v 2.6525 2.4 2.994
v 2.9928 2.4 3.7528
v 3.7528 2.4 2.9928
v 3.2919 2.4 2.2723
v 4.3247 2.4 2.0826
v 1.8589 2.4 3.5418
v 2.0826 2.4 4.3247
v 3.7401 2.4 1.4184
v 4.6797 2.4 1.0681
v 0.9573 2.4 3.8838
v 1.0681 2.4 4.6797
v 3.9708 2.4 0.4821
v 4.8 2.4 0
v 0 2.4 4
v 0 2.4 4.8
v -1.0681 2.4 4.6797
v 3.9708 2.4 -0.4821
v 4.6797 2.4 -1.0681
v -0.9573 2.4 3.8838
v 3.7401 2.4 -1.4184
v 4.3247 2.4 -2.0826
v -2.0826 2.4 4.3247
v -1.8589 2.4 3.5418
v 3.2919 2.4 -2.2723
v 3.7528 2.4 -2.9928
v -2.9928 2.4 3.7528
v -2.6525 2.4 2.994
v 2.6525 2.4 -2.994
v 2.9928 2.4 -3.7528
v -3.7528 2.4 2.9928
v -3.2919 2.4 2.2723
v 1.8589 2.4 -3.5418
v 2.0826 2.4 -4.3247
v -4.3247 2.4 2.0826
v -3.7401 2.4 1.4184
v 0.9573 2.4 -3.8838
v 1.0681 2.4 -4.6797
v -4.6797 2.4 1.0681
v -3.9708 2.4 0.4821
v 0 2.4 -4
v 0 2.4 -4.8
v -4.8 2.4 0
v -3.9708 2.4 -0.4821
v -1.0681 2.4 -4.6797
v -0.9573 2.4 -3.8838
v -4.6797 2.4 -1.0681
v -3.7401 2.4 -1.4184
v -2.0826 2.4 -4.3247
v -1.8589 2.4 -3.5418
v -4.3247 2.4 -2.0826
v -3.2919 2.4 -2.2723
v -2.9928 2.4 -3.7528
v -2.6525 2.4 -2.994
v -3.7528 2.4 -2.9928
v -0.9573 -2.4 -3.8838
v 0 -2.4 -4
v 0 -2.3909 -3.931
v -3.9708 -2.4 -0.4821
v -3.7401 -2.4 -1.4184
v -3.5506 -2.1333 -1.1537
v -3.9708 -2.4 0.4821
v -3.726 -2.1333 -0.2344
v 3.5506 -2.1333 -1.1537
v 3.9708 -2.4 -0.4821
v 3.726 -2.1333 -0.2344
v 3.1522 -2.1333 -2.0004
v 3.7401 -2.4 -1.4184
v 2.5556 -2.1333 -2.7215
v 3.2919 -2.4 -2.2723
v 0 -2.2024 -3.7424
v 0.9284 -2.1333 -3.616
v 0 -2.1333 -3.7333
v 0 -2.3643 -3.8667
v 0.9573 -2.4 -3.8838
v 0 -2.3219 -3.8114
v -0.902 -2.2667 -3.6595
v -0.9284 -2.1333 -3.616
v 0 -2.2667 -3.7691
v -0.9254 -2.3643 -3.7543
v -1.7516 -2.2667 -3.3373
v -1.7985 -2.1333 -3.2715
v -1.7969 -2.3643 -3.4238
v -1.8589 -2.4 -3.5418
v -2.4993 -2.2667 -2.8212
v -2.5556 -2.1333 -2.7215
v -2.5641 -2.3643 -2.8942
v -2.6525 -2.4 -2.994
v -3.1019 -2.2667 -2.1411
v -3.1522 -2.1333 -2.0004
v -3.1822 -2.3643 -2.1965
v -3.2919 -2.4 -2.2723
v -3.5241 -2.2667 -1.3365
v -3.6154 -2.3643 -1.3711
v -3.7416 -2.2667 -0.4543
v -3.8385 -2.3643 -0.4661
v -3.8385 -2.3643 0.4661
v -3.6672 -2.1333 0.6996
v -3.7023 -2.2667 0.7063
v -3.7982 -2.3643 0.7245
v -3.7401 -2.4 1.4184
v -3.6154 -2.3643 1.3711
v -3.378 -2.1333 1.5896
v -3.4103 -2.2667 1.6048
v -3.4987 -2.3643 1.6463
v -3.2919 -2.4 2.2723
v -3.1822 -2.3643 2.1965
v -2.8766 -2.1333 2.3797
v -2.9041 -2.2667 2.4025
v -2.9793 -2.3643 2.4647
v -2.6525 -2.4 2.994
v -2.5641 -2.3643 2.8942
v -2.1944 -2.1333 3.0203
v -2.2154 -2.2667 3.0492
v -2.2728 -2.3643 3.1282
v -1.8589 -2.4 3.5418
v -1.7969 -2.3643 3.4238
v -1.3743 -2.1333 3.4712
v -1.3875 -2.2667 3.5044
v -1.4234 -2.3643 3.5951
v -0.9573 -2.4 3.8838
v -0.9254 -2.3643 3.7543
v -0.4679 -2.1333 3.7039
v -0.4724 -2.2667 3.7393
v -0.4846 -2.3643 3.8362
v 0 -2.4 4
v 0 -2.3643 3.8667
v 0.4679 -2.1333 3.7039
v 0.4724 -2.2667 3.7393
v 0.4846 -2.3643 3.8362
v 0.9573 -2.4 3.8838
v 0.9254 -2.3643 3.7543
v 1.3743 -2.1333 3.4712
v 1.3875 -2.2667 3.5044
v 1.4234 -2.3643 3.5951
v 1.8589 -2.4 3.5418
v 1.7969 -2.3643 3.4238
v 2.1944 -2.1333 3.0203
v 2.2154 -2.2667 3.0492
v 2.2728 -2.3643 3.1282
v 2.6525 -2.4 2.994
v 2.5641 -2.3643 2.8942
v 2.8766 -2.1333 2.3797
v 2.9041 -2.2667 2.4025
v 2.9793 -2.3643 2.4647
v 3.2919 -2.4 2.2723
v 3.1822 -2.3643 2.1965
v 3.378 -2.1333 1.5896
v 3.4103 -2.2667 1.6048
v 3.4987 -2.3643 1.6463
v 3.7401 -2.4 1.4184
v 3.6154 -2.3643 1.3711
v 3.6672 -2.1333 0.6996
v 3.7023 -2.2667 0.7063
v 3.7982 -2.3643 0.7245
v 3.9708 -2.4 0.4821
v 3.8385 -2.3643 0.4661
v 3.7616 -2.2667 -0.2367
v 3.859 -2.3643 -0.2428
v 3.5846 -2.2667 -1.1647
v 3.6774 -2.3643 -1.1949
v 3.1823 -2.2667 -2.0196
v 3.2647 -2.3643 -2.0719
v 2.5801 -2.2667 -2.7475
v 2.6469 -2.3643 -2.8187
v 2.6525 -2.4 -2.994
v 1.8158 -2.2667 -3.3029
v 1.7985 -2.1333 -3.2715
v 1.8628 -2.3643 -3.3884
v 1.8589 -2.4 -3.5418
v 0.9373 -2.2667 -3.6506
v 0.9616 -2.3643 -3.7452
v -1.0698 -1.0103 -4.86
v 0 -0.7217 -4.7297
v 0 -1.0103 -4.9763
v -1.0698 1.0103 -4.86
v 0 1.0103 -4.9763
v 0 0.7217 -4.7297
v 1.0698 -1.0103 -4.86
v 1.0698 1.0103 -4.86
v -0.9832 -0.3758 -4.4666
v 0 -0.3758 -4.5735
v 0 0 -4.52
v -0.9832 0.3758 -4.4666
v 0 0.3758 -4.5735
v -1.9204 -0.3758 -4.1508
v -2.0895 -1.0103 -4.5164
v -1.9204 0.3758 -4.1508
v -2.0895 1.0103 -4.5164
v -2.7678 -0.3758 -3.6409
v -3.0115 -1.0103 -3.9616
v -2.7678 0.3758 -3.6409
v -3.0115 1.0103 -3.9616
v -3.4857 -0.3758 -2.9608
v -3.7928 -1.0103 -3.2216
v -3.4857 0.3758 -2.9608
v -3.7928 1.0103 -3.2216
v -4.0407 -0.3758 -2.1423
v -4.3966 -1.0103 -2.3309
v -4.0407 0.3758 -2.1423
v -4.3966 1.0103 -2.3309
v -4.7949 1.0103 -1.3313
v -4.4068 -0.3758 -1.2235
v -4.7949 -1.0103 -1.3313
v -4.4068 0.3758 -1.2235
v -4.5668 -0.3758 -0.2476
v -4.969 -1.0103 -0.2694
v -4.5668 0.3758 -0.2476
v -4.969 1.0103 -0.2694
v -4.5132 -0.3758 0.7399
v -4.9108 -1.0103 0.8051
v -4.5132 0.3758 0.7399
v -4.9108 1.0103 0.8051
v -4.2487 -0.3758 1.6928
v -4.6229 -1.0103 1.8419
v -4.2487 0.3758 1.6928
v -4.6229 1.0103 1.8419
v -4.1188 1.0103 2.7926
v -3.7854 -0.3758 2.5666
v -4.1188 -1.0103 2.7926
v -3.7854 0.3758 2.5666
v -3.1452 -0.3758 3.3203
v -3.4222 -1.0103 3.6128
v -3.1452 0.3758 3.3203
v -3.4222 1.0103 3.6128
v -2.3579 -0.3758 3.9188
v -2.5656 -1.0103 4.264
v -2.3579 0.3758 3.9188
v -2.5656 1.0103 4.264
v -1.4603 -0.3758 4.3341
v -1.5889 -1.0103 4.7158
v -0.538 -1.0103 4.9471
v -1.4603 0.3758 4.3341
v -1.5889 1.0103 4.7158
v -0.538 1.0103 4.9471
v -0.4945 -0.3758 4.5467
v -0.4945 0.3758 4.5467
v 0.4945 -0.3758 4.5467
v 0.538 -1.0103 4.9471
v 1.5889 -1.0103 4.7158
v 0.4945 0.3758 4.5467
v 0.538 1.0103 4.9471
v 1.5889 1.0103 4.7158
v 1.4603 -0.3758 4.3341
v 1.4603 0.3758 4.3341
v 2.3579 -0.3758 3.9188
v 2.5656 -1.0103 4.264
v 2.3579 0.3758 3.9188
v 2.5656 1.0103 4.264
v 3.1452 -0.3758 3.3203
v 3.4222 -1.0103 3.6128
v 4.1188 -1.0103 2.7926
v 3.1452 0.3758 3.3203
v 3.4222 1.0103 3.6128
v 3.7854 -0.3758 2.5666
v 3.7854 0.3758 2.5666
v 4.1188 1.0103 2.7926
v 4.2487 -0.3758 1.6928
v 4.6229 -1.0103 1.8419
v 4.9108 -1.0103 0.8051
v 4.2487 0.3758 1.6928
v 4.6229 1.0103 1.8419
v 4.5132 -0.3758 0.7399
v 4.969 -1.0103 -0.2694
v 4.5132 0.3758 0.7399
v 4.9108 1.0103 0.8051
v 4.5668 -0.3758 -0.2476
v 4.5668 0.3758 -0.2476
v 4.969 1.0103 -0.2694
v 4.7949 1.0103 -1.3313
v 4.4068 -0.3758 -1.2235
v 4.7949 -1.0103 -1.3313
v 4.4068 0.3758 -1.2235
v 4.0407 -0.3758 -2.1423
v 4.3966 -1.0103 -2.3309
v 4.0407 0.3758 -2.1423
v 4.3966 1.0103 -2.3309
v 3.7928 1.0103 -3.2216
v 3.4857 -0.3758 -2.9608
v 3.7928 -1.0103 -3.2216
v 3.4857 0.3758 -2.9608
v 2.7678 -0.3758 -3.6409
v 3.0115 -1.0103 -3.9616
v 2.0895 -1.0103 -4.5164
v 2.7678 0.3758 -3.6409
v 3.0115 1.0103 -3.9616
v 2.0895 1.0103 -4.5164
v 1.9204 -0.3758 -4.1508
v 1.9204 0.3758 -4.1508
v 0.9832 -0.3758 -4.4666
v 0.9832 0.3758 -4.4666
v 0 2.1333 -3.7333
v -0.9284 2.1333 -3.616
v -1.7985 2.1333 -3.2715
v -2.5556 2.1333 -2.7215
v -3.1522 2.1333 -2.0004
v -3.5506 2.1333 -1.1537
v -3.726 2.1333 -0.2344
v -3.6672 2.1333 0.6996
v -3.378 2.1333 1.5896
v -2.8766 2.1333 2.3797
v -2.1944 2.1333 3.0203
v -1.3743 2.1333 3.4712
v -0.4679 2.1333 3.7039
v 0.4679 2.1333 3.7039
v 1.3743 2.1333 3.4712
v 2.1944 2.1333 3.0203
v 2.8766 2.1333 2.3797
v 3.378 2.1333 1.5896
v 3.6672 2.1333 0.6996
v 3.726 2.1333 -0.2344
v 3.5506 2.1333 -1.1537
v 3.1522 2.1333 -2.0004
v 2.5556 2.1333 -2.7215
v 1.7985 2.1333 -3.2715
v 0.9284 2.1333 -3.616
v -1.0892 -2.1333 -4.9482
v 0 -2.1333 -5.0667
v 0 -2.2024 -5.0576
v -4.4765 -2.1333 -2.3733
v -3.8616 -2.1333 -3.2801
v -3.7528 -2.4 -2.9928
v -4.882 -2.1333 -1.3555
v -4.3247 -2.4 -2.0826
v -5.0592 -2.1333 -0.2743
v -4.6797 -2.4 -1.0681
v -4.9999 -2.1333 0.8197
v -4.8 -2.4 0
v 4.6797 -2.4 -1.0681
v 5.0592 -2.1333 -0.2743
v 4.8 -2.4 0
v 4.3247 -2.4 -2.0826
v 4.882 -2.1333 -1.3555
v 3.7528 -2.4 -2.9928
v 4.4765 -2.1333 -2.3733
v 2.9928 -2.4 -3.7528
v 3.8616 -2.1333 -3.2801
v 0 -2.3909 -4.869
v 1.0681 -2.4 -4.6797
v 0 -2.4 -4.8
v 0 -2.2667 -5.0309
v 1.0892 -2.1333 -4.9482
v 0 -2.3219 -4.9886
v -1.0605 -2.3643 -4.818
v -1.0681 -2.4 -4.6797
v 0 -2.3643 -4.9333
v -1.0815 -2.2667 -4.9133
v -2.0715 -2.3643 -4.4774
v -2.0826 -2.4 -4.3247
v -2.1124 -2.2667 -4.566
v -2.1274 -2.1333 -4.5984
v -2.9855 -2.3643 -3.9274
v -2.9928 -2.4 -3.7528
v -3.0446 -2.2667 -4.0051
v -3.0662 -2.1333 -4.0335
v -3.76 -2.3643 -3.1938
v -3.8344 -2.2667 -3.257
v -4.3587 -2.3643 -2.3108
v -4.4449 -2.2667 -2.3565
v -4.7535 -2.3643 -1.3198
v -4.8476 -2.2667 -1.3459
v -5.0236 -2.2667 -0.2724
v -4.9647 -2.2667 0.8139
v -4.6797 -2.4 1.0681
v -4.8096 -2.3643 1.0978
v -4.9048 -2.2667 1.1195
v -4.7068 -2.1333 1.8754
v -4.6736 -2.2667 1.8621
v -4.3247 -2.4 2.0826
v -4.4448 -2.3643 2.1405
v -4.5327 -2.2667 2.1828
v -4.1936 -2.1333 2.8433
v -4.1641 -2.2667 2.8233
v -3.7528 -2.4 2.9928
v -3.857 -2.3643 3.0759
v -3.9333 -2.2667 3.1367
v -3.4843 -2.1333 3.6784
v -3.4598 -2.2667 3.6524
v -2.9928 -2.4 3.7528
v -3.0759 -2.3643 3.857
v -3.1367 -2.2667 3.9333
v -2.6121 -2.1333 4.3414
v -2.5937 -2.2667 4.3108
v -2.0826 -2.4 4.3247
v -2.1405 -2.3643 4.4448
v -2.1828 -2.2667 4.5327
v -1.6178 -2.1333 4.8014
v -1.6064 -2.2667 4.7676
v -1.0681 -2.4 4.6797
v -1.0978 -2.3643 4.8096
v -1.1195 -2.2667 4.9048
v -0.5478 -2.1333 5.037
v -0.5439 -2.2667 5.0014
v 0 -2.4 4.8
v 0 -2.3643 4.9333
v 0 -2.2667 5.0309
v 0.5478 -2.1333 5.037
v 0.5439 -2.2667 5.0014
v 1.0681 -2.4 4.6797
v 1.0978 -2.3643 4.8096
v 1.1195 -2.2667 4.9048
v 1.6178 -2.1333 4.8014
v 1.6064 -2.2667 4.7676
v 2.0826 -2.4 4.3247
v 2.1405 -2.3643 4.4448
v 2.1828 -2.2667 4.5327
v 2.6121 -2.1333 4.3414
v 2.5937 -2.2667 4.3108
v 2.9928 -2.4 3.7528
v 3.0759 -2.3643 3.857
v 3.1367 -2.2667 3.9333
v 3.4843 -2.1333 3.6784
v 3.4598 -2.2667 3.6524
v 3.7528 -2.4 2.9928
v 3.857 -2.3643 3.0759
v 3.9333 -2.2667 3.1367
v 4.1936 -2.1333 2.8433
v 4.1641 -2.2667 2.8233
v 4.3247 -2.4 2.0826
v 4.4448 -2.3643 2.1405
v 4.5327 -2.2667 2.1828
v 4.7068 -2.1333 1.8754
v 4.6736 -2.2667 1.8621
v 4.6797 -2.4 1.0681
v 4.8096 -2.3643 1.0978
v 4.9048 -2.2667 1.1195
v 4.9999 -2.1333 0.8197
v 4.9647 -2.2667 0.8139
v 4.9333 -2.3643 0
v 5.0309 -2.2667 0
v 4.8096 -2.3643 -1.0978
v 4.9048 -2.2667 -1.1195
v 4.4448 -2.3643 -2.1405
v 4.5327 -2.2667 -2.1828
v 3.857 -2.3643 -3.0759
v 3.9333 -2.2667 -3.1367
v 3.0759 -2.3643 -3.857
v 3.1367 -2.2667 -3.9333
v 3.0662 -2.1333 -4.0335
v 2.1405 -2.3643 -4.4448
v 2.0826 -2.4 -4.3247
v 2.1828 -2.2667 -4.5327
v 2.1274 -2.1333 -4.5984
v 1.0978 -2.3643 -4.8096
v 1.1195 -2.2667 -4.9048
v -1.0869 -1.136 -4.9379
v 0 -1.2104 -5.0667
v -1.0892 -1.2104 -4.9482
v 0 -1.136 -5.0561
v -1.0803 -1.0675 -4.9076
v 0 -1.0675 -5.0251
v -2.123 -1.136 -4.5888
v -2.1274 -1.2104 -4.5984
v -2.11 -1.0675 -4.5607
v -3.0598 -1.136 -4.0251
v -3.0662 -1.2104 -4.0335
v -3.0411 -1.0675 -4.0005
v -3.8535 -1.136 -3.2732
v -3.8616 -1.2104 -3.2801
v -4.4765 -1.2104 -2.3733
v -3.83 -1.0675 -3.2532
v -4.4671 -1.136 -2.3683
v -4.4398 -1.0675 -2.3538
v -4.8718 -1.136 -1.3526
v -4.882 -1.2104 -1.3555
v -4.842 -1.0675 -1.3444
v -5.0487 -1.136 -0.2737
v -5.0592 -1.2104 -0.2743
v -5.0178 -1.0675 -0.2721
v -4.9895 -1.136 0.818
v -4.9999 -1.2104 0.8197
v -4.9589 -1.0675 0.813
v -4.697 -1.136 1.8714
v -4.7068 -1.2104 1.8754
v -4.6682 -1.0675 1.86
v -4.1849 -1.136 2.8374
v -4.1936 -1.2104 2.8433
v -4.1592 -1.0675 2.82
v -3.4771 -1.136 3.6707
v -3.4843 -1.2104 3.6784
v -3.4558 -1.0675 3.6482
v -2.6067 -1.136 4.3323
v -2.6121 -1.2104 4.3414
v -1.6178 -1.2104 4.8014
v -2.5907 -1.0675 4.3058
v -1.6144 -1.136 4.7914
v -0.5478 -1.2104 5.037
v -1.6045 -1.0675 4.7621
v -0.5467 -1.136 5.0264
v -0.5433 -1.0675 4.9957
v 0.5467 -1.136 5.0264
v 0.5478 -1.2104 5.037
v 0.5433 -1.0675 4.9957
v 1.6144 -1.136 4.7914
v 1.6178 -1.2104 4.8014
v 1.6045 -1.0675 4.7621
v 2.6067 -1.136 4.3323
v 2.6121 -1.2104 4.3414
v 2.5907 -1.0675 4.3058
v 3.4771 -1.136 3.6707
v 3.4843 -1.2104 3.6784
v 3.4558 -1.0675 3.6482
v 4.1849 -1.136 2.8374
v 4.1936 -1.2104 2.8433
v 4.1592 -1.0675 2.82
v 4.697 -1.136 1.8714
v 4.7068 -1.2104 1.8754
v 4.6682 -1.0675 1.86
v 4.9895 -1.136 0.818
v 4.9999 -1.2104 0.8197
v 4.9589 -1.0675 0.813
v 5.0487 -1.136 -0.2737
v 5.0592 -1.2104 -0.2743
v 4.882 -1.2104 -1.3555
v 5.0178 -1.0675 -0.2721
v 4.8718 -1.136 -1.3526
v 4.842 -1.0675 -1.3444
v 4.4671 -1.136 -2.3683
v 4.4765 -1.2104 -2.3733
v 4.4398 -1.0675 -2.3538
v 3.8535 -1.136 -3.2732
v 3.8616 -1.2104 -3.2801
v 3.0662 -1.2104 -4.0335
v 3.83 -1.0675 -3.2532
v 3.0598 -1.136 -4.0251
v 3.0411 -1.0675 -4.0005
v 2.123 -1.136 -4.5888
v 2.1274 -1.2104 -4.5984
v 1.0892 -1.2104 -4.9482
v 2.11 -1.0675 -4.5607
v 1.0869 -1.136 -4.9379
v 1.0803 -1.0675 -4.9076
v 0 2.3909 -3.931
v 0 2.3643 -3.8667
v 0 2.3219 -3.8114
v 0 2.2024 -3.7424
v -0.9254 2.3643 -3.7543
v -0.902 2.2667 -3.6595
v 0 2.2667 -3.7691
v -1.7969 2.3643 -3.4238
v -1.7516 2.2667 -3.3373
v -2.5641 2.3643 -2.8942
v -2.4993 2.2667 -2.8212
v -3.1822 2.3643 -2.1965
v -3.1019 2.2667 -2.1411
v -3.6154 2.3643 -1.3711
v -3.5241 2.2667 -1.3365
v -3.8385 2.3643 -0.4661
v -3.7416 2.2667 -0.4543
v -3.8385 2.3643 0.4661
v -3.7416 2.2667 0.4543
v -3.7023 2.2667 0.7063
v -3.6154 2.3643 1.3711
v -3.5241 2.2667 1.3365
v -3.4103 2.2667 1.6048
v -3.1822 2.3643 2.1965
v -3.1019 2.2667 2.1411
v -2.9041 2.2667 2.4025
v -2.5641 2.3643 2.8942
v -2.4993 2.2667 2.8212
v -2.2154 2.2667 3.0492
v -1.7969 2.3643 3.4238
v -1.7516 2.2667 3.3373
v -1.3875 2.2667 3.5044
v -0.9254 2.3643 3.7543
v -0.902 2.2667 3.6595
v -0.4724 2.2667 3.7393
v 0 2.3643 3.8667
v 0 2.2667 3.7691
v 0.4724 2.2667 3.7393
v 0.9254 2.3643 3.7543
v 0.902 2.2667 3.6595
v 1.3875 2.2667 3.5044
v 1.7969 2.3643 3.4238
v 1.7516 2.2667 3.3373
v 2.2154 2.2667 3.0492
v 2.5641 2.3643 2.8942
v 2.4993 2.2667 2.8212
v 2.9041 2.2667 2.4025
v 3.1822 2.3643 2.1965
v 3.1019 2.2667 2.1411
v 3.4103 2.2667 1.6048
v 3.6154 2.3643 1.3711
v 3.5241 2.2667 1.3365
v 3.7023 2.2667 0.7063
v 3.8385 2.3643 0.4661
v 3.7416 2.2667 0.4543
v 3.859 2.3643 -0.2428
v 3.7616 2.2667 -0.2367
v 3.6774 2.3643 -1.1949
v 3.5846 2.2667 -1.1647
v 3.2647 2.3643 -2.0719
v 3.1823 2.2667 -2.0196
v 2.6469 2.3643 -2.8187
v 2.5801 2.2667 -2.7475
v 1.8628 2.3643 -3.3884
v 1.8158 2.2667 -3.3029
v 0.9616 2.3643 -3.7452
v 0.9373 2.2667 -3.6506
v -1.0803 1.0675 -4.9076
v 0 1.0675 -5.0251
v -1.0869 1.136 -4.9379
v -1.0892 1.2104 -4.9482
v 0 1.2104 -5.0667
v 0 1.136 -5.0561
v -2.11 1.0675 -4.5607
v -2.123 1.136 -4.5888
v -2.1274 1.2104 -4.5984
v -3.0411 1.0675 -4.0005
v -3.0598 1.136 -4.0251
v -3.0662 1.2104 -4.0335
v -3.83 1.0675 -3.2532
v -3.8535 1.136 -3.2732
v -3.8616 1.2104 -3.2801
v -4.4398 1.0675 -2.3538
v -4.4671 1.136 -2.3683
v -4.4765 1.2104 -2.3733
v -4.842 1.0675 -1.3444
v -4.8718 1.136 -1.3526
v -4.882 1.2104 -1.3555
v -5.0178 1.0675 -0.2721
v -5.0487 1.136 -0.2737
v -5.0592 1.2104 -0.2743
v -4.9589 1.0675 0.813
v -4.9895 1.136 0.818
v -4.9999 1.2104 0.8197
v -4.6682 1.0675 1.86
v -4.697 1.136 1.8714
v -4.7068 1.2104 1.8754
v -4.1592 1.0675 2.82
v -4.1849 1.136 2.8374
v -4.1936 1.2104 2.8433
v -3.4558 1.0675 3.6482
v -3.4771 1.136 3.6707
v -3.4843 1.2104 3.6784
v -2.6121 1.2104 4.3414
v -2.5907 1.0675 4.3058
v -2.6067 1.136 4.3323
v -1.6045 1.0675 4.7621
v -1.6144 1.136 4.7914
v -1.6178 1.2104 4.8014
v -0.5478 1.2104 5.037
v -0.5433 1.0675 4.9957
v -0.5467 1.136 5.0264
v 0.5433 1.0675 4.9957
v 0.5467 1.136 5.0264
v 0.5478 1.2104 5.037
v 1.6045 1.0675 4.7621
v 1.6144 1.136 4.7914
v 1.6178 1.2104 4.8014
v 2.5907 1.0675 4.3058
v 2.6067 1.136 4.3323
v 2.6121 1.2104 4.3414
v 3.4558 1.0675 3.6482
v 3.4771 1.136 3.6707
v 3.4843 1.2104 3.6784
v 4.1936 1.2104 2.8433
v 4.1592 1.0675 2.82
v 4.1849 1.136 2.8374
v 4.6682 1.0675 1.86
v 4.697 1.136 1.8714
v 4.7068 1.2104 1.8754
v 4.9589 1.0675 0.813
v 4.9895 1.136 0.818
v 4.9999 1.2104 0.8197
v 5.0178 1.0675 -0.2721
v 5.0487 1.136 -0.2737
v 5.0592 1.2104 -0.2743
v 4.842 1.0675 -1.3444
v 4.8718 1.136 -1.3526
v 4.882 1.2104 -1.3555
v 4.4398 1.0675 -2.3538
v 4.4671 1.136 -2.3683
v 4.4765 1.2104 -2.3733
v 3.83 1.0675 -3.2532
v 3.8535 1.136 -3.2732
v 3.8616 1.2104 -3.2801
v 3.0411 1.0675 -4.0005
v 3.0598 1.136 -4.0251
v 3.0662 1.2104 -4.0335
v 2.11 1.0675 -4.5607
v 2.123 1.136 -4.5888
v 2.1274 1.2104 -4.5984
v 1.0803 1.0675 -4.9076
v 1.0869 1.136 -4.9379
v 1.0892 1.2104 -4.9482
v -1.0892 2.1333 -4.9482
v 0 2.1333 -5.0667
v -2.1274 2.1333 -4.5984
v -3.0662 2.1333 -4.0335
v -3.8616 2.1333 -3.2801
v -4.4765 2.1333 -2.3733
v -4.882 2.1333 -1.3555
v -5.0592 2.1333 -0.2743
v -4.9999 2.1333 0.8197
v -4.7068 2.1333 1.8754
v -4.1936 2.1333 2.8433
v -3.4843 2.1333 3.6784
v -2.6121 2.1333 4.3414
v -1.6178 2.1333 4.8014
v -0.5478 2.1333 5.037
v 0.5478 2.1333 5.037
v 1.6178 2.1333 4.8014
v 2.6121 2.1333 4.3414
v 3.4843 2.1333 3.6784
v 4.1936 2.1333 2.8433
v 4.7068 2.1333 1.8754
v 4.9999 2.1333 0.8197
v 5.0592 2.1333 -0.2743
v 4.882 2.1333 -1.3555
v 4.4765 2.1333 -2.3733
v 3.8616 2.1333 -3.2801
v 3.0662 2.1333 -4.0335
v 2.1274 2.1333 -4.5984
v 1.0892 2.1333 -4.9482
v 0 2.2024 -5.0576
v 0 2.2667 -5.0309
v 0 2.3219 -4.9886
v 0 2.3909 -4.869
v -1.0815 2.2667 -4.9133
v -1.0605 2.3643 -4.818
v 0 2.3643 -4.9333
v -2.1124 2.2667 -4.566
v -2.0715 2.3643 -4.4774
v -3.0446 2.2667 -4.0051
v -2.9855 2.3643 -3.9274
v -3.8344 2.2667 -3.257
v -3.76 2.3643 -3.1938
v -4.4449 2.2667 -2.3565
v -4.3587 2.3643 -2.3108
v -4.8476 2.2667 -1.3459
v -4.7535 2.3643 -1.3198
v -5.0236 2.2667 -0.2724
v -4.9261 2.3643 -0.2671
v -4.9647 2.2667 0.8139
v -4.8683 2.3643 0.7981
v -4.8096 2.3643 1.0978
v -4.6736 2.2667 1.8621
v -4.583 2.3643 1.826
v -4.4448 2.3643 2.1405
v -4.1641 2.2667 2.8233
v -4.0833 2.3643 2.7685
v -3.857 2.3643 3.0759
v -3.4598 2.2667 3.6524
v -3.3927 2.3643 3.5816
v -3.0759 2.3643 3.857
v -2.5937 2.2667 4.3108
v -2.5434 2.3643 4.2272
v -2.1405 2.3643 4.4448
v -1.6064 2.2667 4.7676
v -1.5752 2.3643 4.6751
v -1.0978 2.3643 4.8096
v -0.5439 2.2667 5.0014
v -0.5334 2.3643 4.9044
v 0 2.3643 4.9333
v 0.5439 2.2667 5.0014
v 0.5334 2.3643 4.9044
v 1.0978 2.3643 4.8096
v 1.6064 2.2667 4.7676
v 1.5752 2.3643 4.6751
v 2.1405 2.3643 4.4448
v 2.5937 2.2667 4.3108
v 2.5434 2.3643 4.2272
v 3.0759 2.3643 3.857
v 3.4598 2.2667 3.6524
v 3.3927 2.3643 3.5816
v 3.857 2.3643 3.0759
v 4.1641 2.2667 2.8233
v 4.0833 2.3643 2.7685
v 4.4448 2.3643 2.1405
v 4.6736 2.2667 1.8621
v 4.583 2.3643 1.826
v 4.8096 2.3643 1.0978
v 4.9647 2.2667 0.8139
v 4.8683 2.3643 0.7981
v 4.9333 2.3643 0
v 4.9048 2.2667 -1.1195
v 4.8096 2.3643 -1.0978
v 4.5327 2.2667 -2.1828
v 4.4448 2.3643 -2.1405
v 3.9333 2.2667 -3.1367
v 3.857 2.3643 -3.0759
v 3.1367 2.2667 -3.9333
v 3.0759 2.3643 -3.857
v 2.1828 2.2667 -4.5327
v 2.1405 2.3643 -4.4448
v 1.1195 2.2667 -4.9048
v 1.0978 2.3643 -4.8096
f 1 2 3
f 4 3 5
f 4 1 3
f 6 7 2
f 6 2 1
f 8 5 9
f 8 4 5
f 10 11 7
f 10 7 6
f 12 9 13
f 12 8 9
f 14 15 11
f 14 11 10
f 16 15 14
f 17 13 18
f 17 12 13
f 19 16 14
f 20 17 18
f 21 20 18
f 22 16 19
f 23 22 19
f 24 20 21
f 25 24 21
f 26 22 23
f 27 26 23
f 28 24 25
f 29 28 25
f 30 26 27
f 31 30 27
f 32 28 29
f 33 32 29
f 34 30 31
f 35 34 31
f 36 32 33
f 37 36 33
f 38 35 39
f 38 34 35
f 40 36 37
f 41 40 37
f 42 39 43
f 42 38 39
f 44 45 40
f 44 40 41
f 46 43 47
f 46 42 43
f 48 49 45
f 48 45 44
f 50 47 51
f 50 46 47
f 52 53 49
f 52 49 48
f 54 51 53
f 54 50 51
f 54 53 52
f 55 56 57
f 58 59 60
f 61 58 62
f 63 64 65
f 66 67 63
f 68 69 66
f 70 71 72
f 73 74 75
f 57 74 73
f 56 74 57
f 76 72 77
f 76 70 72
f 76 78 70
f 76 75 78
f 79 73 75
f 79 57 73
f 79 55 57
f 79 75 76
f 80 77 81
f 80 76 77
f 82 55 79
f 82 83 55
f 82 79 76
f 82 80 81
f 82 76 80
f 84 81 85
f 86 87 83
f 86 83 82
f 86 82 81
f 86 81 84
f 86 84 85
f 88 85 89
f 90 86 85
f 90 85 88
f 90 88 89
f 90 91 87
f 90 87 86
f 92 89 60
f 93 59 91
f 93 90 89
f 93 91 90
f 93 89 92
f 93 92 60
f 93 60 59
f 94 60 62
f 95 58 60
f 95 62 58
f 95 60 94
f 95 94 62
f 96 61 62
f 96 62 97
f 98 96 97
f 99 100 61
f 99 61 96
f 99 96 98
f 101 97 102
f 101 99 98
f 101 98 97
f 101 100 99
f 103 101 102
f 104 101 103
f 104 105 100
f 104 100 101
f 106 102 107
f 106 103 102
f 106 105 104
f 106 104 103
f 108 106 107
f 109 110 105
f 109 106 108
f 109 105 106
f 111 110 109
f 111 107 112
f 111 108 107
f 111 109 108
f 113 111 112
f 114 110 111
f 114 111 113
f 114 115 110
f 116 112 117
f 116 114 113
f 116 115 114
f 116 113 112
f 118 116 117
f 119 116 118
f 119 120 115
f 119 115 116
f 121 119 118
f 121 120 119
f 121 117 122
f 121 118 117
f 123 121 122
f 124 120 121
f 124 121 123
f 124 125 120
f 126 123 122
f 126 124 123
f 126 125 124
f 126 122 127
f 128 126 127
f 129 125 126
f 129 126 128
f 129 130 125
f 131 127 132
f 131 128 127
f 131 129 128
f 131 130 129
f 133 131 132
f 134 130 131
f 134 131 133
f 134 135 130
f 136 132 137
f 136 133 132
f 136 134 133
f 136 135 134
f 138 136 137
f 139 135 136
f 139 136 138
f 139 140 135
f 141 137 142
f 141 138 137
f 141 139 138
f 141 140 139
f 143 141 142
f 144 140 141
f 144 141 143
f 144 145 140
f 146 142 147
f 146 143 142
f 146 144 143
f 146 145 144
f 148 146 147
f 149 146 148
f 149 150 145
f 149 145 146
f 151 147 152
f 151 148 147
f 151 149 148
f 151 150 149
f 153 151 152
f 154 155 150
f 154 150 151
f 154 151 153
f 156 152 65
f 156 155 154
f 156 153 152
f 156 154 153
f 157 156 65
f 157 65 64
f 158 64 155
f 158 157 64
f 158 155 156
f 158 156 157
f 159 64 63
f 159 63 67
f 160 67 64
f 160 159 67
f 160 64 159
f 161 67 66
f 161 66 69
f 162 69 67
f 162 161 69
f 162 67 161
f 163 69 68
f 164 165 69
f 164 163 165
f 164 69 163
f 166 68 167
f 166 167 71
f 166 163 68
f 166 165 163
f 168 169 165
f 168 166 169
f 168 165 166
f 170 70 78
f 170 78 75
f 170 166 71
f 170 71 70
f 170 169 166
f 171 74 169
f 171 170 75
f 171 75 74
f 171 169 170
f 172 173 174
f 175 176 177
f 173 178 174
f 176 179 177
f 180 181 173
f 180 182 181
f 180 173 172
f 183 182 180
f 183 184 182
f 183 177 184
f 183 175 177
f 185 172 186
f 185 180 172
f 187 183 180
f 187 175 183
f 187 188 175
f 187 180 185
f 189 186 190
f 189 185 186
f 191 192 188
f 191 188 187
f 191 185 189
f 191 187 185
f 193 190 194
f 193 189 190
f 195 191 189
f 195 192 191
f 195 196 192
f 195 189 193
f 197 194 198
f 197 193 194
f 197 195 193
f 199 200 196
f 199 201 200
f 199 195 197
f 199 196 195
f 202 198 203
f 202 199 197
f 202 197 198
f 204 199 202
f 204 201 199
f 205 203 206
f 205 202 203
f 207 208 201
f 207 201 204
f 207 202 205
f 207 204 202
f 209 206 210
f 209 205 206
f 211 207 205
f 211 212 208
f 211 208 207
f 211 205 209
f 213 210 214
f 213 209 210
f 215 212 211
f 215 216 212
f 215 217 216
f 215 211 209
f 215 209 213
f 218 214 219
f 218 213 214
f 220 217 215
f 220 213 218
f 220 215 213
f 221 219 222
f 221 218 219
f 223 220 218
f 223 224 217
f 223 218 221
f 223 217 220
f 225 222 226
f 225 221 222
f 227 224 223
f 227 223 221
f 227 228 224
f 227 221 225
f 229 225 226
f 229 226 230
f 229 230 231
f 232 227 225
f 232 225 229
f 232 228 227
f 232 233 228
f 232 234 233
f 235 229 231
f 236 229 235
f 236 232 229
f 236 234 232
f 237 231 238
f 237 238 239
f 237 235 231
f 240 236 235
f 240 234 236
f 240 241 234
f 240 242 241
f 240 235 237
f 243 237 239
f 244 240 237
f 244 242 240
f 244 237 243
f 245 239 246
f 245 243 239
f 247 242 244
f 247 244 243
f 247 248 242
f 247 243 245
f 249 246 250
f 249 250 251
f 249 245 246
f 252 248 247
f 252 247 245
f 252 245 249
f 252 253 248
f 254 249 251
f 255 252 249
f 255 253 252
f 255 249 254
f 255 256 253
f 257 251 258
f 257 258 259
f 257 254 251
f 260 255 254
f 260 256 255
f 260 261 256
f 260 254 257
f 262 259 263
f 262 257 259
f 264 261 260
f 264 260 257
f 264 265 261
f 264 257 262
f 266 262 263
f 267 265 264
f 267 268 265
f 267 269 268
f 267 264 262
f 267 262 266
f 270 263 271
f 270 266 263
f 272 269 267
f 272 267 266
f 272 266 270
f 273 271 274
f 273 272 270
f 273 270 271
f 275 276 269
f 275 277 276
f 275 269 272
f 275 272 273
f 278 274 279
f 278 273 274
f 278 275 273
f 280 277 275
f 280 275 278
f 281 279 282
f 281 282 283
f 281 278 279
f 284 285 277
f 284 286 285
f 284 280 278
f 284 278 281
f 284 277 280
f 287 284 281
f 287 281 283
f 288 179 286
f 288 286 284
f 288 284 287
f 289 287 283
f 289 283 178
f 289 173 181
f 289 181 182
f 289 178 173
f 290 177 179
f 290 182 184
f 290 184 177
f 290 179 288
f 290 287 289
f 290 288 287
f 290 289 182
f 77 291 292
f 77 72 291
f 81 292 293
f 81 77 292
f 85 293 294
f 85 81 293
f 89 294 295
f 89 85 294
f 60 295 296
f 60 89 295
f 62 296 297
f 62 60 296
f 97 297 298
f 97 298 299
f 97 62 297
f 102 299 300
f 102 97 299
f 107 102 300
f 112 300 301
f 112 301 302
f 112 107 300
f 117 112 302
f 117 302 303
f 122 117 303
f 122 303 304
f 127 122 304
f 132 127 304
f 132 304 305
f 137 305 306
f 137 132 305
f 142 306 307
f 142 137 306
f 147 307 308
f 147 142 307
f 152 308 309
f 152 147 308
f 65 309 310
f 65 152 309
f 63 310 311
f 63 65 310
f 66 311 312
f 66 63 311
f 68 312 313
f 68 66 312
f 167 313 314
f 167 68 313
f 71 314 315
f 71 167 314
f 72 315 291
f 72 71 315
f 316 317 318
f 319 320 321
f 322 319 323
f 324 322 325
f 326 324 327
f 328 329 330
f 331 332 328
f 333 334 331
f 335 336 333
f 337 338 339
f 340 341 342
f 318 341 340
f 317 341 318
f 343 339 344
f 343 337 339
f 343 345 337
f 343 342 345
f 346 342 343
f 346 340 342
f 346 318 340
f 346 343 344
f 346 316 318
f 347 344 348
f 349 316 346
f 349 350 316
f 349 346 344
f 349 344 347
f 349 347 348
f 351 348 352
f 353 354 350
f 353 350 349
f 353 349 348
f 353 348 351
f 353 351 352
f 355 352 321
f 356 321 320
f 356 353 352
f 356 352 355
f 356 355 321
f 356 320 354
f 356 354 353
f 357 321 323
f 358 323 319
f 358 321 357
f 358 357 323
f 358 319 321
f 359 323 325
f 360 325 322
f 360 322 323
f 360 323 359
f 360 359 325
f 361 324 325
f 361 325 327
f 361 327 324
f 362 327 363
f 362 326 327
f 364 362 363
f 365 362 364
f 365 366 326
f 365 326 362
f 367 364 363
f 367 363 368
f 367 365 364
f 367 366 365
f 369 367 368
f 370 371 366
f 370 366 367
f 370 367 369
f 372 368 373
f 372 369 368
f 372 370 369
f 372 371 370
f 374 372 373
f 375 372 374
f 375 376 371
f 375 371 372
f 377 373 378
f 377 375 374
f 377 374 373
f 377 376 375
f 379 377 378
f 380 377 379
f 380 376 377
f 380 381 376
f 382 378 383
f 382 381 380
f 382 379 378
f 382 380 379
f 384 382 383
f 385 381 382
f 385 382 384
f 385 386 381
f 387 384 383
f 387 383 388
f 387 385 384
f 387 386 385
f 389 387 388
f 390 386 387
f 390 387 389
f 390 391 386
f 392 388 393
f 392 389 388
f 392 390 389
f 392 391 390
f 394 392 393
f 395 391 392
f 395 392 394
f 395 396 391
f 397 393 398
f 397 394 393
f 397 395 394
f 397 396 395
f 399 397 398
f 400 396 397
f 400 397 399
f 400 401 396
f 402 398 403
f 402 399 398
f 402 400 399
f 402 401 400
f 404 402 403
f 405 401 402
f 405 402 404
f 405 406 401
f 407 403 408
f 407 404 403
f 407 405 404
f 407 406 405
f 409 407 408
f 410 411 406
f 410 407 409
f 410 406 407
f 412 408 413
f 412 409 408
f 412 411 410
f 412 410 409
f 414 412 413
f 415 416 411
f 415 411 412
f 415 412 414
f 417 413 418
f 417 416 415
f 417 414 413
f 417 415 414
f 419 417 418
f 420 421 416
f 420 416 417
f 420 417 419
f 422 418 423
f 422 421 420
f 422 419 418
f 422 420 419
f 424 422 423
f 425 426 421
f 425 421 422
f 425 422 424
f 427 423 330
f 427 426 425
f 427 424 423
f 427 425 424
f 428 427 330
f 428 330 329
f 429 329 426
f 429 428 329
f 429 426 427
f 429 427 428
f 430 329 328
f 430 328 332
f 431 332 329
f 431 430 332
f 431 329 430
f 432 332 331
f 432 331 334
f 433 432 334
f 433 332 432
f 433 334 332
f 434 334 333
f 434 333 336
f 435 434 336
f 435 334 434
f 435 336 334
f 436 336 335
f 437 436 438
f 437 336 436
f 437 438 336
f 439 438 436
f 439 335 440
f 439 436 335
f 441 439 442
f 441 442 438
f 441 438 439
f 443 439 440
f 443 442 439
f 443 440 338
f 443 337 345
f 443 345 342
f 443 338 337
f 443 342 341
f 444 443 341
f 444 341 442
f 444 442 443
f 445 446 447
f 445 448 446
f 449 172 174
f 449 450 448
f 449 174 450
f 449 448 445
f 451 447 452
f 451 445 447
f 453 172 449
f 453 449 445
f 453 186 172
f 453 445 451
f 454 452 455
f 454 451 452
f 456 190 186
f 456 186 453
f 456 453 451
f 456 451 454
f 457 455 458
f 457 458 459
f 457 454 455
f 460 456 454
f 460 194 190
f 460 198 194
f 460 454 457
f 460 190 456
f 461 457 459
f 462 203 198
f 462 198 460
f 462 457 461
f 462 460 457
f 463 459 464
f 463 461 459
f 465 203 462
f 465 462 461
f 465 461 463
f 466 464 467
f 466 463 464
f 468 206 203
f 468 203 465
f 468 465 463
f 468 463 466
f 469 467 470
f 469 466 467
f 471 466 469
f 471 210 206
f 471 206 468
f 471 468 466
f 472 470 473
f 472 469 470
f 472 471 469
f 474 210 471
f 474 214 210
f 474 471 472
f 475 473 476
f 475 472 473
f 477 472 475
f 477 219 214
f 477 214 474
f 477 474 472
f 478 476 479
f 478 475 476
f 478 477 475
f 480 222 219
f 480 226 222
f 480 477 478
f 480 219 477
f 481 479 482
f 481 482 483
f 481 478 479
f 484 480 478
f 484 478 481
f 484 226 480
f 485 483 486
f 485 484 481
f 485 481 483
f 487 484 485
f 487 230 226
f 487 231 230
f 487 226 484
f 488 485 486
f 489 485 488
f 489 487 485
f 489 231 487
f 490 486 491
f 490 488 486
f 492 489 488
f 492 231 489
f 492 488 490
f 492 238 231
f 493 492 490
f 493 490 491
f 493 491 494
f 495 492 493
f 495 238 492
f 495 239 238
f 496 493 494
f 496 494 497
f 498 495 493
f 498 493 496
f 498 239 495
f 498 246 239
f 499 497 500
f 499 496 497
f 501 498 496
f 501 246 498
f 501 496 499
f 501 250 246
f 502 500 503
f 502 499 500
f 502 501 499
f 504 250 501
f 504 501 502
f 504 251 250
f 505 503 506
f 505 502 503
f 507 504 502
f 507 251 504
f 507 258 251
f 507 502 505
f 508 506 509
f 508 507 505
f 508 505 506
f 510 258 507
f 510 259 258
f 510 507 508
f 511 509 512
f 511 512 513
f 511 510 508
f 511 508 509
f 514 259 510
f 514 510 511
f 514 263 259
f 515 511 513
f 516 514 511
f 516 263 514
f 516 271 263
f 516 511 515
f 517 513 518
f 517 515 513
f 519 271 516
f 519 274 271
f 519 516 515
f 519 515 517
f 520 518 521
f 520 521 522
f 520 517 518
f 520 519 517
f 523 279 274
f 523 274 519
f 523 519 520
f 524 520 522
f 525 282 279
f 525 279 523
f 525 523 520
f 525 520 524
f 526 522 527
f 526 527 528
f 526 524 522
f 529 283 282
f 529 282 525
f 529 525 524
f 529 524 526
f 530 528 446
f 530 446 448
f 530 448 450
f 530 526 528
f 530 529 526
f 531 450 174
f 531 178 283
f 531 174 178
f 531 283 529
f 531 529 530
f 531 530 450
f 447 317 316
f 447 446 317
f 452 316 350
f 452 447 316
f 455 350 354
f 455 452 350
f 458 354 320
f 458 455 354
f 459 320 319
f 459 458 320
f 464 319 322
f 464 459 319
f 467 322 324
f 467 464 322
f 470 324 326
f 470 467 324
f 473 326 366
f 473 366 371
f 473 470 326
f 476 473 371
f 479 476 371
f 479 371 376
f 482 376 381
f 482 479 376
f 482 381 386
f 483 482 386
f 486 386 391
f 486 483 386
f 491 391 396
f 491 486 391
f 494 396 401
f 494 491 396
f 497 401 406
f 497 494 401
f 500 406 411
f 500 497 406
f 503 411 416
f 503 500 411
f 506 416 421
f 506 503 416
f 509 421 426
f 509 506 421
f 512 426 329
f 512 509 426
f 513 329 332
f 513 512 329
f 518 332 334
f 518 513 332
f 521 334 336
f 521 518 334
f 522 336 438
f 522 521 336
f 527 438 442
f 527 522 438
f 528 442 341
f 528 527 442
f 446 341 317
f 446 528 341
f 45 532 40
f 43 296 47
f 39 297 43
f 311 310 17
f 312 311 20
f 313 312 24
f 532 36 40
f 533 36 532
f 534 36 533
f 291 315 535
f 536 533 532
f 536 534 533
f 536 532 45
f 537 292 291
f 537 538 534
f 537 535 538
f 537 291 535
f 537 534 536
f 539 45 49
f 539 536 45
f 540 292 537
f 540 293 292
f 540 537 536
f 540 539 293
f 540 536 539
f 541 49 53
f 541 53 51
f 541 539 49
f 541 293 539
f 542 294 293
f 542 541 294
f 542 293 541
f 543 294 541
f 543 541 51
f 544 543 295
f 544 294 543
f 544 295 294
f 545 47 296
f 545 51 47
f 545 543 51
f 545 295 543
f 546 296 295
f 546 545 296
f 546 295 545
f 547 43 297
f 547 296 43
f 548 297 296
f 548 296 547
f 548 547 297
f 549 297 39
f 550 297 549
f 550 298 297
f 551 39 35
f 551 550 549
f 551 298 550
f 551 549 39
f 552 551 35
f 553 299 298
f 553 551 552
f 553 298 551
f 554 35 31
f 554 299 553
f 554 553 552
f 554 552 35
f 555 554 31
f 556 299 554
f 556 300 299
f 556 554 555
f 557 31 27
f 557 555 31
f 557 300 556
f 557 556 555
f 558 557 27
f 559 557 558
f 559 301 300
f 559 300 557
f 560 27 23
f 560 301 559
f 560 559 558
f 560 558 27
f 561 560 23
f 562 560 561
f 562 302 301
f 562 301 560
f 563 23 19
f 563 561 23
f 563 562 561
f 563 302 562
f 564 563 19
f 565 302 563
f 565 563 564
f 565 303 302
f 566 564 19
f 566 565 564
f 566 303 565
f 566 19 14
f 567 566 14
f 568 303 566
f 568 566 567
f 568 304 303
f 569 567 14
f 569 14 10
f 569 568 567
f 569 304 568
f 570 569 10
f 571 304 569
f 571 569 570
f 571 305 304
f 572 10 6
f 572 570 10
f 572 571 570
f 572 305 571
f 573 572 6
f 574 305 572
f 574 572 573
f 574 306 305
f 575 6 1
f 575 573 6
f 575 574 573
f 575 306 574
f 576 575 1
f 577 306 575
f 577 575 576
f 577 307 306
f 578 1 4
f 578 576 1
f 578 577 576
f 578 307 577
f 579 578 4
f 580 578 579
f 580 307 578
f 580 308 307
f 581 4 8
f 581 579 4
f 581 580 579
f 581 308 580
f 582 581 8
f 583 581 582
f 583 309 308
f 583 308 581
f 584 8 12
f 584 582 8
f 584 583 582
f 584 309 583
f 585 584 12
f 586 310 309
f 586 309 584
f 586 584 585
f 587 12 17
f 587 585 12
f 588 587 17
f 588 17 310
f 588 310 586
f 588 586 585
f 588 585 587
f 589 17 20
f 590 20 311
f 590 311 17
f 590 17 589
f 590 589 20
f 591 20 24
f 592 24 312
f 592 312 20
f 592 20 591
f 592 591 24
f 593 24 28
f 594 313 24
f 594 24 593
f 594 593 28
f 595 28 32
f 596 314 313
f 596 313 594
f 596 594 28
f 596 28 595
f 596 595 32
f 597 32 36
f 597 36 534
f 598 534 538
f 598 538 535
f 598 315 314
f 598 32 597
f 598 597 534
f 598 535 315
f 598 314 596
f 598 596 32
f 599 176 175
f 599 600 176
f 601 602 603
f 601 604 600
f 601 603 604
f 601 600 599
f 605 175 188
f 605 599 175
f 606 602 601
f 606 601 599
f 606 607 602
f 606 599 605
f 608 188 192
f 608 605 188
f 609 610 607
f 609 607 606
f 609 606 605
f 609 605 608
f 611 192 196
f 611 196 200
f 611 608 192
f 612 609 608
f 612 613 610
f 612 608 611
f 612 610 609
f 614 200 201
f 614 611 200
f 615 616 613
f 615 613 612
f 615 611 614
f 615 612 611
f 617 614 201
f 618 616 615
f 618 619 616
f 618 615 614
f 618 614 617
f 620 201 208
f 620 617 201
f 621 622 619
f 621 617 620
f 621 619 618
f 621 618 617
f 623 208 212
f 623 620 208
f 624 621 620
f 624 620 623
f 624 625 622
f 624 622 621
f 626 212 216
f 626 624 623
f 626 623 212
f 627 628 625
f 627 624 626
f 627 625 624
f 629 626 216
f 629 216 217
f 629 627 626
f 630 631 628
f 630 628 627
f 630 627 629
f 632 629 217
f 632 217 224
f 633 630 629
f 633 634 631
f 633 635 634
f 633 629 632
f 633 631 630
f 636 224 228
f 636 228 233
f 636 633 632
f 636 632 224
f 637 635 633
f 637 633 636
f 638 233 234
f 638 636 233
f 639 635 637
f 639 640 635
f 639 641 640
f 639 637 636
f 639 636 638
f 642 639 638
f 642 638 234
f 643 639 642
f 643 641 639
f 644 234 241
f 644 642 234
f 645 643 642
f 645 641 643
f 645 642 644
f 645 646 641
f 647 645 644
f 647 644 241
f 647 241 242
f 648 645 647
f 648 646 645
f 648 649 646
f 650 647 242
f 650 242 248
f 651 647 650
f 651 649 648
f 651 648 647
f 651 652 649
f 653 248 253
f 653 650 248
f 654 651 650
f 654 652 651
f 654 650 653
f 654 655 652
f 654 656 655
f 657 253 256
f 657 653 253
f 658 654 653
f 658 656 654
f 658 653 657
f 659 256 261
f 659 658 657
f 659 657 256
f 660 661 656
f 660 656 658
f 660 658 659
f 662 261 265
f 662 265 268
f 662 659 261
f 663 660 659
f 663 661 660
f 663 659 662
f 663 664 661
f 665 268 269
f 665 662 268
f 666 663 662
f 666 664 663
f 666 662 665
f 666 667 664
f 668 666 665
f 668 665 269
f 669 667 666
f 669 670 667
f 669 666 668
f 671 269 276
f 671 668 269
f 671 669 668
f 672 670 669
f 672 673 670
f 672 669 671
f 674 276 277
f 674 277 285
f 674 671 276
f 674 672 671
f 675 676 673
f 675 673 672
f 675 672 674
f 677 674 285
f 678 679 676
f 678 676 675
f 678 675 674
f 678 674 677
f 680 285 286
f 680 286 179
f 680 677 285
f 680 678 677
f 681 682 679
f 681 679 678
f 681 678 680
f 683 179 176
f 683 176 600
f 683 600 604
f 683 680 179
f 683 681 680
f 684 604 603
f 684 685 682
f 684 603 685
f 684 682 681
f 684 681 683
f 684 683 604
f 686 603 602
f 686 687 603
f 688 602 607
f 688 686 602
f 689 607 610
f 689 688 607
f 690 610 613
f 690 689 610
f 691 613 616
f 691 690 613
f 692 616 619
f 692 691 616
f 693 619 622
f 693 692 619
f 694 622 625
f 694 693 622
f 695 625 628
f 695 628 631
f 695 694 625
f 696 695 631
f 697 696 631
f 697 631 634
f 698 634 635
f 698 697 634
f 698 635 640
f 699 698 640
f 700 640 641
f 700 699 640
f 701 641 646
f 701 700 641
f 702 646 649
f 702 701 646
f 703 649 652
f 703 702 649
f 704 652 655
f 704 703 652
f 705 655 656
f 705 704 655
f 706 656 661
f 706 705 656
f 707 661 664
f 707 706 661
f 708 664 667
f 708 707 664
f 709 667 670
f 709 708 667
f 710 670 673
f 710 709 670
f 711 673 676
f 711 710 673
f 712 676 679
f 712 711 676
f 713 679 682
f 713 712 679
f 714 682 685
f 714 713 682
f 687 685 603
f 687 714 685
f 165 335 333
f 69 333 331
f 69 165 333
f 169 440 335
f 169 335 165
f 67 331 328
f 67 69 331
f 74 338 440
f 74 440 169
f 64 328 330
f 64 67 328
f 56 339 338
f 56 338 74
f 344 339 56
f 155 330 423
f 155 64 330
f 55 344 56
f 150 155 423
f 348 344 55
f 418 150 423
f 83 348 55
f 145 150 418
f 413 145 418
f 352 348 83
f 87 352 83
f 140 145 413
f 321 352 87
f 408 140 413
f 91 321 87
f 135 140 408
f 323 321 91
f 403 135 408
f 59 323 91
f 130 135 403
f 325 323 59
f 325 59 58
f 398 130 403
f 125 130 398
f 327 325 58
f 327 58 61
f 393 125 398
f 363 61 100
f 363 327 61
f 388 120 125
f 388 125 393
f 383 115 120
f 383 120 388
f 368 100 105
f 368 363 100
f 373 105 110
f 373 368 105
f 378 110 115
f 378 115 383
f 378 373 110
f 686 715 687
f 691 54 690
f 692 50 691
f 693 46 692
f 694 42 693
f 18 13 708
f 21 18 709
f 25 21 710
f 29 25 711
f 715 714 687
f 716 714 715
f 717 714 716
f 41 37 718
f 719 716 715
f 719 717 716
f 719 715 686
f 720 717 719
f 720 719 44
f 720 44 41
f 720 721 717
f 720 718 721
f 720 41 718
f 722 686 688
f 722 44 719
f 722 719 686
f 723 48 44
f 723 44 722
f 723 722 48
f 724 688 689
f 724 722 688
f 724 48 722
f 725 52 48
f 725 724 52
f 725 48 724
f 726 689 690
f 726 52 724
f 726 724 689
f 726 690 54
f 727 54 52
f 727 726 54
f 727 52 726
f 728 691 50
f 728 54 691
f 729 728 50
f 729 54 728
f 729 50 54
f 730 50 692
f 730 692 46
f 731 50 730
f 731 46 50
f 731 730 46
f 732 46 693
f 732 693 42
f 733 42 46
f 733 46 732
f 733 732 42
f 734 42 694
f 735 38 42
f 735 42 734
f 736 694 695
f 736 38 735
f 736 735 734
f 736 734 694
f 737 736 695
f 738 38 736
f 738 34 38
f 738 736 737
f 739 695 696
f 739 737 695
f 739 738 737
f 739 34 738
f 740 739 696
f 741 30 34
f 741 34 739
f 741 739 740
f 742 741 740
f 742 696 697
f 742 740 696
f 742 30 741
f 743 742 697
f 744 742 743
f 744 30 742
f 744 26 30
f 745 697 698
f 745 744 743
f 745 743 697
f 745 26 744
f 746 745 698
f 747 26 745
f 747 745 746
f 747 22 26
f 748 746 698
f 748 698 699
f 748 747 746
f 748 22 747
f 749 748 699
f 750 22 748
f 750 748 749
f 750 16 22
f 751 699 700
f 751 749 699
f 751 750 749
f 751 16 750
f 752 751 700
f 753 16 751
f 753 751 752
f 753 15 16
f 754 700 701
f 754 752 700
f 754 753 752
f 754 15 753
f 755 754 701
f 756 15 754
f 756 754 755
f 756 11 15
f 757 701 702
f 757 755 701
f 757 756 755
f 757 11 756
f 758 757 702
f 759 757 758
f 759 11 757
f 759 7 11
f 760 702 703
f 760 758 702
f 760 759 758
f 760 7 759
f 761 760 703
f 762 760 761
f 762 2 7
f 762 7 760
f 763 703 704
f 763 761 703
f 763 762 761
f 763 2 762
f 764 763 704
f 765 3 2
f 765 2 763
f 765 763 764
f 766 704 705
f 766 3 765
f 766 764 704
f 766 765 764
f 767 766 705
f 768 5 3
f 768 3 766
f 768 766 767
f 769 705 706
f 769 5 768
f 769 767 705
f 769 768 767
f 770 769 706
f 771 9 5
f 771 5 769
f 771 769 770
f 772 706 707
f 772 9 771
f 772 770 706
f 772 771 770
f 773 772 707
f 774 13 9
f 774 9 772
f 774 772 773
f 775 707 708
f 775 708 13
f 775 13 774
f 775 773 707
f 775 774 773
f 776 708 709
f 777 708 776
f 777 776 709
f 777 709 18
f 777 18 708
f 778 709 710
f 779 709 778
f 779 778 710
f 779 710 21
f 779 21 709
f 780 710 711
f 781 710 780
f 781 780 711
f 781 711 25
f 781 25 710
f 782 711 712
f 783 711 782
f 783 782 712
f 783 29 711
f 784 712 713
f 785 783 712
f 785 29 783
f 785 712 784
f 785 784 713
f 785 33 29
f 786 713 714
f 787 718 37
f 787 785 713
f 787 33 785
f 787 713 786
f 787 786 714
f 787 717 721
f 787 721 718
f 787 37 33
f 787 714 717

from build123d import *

# Parameters (mm, degrees)
SCALE1_SCALE = 0.266666667


with BuildPart() as part:
    # Sketch1 → Revolve1 (revolve)
    with BuildSketch(Plane(origin=(0, 0, 0), x_dir=(0, 0, -1), z_dir=(1, 0, 0))):
        with BuildLine():
            Line((14, 8), (14, -8))
            ThreePointArc((14, -8), (14.292893219, -8.707106781), (15, -9))
            Line((15, -9), (18, -9))
            ThreePointArc((18, -9), (18.707106781, -8.707106781), (19, -8))
            Line((19, -8), (19, -4.538997687))
            ThreePointArc((19, -4.538997687), (18.911360803, -4.127389271), (18.661157025, -3.788750135))
            ThreePointArc((18.661157025, -3.788750135), (16.95, 0), (18.661157025, 3.788750135))
            ThreePointArc((18.661157025, 3.788750135), (18.911360803, 4.127389271), (19, 4.538997687))
            Line((19, 4.538997687), (19, 8))
            ThreePointArc((19, 8), (18.707106781, 8.707106781), (18, 9))
            Line((18, 9), (15, 9))
            ThreePointArc((15, 9), (14.292893219, 8.707106781), (14, 8))
        make_face()
    revolve(axis=Axis((0, -9.810774163, 0), (0, 1, 0)))


with BuildPart() as part_1:
    # Scale1: scaled about (0, 0, 0)
    add(part.part.scale(SCALE1_SCALE))


solid = part_1.part
